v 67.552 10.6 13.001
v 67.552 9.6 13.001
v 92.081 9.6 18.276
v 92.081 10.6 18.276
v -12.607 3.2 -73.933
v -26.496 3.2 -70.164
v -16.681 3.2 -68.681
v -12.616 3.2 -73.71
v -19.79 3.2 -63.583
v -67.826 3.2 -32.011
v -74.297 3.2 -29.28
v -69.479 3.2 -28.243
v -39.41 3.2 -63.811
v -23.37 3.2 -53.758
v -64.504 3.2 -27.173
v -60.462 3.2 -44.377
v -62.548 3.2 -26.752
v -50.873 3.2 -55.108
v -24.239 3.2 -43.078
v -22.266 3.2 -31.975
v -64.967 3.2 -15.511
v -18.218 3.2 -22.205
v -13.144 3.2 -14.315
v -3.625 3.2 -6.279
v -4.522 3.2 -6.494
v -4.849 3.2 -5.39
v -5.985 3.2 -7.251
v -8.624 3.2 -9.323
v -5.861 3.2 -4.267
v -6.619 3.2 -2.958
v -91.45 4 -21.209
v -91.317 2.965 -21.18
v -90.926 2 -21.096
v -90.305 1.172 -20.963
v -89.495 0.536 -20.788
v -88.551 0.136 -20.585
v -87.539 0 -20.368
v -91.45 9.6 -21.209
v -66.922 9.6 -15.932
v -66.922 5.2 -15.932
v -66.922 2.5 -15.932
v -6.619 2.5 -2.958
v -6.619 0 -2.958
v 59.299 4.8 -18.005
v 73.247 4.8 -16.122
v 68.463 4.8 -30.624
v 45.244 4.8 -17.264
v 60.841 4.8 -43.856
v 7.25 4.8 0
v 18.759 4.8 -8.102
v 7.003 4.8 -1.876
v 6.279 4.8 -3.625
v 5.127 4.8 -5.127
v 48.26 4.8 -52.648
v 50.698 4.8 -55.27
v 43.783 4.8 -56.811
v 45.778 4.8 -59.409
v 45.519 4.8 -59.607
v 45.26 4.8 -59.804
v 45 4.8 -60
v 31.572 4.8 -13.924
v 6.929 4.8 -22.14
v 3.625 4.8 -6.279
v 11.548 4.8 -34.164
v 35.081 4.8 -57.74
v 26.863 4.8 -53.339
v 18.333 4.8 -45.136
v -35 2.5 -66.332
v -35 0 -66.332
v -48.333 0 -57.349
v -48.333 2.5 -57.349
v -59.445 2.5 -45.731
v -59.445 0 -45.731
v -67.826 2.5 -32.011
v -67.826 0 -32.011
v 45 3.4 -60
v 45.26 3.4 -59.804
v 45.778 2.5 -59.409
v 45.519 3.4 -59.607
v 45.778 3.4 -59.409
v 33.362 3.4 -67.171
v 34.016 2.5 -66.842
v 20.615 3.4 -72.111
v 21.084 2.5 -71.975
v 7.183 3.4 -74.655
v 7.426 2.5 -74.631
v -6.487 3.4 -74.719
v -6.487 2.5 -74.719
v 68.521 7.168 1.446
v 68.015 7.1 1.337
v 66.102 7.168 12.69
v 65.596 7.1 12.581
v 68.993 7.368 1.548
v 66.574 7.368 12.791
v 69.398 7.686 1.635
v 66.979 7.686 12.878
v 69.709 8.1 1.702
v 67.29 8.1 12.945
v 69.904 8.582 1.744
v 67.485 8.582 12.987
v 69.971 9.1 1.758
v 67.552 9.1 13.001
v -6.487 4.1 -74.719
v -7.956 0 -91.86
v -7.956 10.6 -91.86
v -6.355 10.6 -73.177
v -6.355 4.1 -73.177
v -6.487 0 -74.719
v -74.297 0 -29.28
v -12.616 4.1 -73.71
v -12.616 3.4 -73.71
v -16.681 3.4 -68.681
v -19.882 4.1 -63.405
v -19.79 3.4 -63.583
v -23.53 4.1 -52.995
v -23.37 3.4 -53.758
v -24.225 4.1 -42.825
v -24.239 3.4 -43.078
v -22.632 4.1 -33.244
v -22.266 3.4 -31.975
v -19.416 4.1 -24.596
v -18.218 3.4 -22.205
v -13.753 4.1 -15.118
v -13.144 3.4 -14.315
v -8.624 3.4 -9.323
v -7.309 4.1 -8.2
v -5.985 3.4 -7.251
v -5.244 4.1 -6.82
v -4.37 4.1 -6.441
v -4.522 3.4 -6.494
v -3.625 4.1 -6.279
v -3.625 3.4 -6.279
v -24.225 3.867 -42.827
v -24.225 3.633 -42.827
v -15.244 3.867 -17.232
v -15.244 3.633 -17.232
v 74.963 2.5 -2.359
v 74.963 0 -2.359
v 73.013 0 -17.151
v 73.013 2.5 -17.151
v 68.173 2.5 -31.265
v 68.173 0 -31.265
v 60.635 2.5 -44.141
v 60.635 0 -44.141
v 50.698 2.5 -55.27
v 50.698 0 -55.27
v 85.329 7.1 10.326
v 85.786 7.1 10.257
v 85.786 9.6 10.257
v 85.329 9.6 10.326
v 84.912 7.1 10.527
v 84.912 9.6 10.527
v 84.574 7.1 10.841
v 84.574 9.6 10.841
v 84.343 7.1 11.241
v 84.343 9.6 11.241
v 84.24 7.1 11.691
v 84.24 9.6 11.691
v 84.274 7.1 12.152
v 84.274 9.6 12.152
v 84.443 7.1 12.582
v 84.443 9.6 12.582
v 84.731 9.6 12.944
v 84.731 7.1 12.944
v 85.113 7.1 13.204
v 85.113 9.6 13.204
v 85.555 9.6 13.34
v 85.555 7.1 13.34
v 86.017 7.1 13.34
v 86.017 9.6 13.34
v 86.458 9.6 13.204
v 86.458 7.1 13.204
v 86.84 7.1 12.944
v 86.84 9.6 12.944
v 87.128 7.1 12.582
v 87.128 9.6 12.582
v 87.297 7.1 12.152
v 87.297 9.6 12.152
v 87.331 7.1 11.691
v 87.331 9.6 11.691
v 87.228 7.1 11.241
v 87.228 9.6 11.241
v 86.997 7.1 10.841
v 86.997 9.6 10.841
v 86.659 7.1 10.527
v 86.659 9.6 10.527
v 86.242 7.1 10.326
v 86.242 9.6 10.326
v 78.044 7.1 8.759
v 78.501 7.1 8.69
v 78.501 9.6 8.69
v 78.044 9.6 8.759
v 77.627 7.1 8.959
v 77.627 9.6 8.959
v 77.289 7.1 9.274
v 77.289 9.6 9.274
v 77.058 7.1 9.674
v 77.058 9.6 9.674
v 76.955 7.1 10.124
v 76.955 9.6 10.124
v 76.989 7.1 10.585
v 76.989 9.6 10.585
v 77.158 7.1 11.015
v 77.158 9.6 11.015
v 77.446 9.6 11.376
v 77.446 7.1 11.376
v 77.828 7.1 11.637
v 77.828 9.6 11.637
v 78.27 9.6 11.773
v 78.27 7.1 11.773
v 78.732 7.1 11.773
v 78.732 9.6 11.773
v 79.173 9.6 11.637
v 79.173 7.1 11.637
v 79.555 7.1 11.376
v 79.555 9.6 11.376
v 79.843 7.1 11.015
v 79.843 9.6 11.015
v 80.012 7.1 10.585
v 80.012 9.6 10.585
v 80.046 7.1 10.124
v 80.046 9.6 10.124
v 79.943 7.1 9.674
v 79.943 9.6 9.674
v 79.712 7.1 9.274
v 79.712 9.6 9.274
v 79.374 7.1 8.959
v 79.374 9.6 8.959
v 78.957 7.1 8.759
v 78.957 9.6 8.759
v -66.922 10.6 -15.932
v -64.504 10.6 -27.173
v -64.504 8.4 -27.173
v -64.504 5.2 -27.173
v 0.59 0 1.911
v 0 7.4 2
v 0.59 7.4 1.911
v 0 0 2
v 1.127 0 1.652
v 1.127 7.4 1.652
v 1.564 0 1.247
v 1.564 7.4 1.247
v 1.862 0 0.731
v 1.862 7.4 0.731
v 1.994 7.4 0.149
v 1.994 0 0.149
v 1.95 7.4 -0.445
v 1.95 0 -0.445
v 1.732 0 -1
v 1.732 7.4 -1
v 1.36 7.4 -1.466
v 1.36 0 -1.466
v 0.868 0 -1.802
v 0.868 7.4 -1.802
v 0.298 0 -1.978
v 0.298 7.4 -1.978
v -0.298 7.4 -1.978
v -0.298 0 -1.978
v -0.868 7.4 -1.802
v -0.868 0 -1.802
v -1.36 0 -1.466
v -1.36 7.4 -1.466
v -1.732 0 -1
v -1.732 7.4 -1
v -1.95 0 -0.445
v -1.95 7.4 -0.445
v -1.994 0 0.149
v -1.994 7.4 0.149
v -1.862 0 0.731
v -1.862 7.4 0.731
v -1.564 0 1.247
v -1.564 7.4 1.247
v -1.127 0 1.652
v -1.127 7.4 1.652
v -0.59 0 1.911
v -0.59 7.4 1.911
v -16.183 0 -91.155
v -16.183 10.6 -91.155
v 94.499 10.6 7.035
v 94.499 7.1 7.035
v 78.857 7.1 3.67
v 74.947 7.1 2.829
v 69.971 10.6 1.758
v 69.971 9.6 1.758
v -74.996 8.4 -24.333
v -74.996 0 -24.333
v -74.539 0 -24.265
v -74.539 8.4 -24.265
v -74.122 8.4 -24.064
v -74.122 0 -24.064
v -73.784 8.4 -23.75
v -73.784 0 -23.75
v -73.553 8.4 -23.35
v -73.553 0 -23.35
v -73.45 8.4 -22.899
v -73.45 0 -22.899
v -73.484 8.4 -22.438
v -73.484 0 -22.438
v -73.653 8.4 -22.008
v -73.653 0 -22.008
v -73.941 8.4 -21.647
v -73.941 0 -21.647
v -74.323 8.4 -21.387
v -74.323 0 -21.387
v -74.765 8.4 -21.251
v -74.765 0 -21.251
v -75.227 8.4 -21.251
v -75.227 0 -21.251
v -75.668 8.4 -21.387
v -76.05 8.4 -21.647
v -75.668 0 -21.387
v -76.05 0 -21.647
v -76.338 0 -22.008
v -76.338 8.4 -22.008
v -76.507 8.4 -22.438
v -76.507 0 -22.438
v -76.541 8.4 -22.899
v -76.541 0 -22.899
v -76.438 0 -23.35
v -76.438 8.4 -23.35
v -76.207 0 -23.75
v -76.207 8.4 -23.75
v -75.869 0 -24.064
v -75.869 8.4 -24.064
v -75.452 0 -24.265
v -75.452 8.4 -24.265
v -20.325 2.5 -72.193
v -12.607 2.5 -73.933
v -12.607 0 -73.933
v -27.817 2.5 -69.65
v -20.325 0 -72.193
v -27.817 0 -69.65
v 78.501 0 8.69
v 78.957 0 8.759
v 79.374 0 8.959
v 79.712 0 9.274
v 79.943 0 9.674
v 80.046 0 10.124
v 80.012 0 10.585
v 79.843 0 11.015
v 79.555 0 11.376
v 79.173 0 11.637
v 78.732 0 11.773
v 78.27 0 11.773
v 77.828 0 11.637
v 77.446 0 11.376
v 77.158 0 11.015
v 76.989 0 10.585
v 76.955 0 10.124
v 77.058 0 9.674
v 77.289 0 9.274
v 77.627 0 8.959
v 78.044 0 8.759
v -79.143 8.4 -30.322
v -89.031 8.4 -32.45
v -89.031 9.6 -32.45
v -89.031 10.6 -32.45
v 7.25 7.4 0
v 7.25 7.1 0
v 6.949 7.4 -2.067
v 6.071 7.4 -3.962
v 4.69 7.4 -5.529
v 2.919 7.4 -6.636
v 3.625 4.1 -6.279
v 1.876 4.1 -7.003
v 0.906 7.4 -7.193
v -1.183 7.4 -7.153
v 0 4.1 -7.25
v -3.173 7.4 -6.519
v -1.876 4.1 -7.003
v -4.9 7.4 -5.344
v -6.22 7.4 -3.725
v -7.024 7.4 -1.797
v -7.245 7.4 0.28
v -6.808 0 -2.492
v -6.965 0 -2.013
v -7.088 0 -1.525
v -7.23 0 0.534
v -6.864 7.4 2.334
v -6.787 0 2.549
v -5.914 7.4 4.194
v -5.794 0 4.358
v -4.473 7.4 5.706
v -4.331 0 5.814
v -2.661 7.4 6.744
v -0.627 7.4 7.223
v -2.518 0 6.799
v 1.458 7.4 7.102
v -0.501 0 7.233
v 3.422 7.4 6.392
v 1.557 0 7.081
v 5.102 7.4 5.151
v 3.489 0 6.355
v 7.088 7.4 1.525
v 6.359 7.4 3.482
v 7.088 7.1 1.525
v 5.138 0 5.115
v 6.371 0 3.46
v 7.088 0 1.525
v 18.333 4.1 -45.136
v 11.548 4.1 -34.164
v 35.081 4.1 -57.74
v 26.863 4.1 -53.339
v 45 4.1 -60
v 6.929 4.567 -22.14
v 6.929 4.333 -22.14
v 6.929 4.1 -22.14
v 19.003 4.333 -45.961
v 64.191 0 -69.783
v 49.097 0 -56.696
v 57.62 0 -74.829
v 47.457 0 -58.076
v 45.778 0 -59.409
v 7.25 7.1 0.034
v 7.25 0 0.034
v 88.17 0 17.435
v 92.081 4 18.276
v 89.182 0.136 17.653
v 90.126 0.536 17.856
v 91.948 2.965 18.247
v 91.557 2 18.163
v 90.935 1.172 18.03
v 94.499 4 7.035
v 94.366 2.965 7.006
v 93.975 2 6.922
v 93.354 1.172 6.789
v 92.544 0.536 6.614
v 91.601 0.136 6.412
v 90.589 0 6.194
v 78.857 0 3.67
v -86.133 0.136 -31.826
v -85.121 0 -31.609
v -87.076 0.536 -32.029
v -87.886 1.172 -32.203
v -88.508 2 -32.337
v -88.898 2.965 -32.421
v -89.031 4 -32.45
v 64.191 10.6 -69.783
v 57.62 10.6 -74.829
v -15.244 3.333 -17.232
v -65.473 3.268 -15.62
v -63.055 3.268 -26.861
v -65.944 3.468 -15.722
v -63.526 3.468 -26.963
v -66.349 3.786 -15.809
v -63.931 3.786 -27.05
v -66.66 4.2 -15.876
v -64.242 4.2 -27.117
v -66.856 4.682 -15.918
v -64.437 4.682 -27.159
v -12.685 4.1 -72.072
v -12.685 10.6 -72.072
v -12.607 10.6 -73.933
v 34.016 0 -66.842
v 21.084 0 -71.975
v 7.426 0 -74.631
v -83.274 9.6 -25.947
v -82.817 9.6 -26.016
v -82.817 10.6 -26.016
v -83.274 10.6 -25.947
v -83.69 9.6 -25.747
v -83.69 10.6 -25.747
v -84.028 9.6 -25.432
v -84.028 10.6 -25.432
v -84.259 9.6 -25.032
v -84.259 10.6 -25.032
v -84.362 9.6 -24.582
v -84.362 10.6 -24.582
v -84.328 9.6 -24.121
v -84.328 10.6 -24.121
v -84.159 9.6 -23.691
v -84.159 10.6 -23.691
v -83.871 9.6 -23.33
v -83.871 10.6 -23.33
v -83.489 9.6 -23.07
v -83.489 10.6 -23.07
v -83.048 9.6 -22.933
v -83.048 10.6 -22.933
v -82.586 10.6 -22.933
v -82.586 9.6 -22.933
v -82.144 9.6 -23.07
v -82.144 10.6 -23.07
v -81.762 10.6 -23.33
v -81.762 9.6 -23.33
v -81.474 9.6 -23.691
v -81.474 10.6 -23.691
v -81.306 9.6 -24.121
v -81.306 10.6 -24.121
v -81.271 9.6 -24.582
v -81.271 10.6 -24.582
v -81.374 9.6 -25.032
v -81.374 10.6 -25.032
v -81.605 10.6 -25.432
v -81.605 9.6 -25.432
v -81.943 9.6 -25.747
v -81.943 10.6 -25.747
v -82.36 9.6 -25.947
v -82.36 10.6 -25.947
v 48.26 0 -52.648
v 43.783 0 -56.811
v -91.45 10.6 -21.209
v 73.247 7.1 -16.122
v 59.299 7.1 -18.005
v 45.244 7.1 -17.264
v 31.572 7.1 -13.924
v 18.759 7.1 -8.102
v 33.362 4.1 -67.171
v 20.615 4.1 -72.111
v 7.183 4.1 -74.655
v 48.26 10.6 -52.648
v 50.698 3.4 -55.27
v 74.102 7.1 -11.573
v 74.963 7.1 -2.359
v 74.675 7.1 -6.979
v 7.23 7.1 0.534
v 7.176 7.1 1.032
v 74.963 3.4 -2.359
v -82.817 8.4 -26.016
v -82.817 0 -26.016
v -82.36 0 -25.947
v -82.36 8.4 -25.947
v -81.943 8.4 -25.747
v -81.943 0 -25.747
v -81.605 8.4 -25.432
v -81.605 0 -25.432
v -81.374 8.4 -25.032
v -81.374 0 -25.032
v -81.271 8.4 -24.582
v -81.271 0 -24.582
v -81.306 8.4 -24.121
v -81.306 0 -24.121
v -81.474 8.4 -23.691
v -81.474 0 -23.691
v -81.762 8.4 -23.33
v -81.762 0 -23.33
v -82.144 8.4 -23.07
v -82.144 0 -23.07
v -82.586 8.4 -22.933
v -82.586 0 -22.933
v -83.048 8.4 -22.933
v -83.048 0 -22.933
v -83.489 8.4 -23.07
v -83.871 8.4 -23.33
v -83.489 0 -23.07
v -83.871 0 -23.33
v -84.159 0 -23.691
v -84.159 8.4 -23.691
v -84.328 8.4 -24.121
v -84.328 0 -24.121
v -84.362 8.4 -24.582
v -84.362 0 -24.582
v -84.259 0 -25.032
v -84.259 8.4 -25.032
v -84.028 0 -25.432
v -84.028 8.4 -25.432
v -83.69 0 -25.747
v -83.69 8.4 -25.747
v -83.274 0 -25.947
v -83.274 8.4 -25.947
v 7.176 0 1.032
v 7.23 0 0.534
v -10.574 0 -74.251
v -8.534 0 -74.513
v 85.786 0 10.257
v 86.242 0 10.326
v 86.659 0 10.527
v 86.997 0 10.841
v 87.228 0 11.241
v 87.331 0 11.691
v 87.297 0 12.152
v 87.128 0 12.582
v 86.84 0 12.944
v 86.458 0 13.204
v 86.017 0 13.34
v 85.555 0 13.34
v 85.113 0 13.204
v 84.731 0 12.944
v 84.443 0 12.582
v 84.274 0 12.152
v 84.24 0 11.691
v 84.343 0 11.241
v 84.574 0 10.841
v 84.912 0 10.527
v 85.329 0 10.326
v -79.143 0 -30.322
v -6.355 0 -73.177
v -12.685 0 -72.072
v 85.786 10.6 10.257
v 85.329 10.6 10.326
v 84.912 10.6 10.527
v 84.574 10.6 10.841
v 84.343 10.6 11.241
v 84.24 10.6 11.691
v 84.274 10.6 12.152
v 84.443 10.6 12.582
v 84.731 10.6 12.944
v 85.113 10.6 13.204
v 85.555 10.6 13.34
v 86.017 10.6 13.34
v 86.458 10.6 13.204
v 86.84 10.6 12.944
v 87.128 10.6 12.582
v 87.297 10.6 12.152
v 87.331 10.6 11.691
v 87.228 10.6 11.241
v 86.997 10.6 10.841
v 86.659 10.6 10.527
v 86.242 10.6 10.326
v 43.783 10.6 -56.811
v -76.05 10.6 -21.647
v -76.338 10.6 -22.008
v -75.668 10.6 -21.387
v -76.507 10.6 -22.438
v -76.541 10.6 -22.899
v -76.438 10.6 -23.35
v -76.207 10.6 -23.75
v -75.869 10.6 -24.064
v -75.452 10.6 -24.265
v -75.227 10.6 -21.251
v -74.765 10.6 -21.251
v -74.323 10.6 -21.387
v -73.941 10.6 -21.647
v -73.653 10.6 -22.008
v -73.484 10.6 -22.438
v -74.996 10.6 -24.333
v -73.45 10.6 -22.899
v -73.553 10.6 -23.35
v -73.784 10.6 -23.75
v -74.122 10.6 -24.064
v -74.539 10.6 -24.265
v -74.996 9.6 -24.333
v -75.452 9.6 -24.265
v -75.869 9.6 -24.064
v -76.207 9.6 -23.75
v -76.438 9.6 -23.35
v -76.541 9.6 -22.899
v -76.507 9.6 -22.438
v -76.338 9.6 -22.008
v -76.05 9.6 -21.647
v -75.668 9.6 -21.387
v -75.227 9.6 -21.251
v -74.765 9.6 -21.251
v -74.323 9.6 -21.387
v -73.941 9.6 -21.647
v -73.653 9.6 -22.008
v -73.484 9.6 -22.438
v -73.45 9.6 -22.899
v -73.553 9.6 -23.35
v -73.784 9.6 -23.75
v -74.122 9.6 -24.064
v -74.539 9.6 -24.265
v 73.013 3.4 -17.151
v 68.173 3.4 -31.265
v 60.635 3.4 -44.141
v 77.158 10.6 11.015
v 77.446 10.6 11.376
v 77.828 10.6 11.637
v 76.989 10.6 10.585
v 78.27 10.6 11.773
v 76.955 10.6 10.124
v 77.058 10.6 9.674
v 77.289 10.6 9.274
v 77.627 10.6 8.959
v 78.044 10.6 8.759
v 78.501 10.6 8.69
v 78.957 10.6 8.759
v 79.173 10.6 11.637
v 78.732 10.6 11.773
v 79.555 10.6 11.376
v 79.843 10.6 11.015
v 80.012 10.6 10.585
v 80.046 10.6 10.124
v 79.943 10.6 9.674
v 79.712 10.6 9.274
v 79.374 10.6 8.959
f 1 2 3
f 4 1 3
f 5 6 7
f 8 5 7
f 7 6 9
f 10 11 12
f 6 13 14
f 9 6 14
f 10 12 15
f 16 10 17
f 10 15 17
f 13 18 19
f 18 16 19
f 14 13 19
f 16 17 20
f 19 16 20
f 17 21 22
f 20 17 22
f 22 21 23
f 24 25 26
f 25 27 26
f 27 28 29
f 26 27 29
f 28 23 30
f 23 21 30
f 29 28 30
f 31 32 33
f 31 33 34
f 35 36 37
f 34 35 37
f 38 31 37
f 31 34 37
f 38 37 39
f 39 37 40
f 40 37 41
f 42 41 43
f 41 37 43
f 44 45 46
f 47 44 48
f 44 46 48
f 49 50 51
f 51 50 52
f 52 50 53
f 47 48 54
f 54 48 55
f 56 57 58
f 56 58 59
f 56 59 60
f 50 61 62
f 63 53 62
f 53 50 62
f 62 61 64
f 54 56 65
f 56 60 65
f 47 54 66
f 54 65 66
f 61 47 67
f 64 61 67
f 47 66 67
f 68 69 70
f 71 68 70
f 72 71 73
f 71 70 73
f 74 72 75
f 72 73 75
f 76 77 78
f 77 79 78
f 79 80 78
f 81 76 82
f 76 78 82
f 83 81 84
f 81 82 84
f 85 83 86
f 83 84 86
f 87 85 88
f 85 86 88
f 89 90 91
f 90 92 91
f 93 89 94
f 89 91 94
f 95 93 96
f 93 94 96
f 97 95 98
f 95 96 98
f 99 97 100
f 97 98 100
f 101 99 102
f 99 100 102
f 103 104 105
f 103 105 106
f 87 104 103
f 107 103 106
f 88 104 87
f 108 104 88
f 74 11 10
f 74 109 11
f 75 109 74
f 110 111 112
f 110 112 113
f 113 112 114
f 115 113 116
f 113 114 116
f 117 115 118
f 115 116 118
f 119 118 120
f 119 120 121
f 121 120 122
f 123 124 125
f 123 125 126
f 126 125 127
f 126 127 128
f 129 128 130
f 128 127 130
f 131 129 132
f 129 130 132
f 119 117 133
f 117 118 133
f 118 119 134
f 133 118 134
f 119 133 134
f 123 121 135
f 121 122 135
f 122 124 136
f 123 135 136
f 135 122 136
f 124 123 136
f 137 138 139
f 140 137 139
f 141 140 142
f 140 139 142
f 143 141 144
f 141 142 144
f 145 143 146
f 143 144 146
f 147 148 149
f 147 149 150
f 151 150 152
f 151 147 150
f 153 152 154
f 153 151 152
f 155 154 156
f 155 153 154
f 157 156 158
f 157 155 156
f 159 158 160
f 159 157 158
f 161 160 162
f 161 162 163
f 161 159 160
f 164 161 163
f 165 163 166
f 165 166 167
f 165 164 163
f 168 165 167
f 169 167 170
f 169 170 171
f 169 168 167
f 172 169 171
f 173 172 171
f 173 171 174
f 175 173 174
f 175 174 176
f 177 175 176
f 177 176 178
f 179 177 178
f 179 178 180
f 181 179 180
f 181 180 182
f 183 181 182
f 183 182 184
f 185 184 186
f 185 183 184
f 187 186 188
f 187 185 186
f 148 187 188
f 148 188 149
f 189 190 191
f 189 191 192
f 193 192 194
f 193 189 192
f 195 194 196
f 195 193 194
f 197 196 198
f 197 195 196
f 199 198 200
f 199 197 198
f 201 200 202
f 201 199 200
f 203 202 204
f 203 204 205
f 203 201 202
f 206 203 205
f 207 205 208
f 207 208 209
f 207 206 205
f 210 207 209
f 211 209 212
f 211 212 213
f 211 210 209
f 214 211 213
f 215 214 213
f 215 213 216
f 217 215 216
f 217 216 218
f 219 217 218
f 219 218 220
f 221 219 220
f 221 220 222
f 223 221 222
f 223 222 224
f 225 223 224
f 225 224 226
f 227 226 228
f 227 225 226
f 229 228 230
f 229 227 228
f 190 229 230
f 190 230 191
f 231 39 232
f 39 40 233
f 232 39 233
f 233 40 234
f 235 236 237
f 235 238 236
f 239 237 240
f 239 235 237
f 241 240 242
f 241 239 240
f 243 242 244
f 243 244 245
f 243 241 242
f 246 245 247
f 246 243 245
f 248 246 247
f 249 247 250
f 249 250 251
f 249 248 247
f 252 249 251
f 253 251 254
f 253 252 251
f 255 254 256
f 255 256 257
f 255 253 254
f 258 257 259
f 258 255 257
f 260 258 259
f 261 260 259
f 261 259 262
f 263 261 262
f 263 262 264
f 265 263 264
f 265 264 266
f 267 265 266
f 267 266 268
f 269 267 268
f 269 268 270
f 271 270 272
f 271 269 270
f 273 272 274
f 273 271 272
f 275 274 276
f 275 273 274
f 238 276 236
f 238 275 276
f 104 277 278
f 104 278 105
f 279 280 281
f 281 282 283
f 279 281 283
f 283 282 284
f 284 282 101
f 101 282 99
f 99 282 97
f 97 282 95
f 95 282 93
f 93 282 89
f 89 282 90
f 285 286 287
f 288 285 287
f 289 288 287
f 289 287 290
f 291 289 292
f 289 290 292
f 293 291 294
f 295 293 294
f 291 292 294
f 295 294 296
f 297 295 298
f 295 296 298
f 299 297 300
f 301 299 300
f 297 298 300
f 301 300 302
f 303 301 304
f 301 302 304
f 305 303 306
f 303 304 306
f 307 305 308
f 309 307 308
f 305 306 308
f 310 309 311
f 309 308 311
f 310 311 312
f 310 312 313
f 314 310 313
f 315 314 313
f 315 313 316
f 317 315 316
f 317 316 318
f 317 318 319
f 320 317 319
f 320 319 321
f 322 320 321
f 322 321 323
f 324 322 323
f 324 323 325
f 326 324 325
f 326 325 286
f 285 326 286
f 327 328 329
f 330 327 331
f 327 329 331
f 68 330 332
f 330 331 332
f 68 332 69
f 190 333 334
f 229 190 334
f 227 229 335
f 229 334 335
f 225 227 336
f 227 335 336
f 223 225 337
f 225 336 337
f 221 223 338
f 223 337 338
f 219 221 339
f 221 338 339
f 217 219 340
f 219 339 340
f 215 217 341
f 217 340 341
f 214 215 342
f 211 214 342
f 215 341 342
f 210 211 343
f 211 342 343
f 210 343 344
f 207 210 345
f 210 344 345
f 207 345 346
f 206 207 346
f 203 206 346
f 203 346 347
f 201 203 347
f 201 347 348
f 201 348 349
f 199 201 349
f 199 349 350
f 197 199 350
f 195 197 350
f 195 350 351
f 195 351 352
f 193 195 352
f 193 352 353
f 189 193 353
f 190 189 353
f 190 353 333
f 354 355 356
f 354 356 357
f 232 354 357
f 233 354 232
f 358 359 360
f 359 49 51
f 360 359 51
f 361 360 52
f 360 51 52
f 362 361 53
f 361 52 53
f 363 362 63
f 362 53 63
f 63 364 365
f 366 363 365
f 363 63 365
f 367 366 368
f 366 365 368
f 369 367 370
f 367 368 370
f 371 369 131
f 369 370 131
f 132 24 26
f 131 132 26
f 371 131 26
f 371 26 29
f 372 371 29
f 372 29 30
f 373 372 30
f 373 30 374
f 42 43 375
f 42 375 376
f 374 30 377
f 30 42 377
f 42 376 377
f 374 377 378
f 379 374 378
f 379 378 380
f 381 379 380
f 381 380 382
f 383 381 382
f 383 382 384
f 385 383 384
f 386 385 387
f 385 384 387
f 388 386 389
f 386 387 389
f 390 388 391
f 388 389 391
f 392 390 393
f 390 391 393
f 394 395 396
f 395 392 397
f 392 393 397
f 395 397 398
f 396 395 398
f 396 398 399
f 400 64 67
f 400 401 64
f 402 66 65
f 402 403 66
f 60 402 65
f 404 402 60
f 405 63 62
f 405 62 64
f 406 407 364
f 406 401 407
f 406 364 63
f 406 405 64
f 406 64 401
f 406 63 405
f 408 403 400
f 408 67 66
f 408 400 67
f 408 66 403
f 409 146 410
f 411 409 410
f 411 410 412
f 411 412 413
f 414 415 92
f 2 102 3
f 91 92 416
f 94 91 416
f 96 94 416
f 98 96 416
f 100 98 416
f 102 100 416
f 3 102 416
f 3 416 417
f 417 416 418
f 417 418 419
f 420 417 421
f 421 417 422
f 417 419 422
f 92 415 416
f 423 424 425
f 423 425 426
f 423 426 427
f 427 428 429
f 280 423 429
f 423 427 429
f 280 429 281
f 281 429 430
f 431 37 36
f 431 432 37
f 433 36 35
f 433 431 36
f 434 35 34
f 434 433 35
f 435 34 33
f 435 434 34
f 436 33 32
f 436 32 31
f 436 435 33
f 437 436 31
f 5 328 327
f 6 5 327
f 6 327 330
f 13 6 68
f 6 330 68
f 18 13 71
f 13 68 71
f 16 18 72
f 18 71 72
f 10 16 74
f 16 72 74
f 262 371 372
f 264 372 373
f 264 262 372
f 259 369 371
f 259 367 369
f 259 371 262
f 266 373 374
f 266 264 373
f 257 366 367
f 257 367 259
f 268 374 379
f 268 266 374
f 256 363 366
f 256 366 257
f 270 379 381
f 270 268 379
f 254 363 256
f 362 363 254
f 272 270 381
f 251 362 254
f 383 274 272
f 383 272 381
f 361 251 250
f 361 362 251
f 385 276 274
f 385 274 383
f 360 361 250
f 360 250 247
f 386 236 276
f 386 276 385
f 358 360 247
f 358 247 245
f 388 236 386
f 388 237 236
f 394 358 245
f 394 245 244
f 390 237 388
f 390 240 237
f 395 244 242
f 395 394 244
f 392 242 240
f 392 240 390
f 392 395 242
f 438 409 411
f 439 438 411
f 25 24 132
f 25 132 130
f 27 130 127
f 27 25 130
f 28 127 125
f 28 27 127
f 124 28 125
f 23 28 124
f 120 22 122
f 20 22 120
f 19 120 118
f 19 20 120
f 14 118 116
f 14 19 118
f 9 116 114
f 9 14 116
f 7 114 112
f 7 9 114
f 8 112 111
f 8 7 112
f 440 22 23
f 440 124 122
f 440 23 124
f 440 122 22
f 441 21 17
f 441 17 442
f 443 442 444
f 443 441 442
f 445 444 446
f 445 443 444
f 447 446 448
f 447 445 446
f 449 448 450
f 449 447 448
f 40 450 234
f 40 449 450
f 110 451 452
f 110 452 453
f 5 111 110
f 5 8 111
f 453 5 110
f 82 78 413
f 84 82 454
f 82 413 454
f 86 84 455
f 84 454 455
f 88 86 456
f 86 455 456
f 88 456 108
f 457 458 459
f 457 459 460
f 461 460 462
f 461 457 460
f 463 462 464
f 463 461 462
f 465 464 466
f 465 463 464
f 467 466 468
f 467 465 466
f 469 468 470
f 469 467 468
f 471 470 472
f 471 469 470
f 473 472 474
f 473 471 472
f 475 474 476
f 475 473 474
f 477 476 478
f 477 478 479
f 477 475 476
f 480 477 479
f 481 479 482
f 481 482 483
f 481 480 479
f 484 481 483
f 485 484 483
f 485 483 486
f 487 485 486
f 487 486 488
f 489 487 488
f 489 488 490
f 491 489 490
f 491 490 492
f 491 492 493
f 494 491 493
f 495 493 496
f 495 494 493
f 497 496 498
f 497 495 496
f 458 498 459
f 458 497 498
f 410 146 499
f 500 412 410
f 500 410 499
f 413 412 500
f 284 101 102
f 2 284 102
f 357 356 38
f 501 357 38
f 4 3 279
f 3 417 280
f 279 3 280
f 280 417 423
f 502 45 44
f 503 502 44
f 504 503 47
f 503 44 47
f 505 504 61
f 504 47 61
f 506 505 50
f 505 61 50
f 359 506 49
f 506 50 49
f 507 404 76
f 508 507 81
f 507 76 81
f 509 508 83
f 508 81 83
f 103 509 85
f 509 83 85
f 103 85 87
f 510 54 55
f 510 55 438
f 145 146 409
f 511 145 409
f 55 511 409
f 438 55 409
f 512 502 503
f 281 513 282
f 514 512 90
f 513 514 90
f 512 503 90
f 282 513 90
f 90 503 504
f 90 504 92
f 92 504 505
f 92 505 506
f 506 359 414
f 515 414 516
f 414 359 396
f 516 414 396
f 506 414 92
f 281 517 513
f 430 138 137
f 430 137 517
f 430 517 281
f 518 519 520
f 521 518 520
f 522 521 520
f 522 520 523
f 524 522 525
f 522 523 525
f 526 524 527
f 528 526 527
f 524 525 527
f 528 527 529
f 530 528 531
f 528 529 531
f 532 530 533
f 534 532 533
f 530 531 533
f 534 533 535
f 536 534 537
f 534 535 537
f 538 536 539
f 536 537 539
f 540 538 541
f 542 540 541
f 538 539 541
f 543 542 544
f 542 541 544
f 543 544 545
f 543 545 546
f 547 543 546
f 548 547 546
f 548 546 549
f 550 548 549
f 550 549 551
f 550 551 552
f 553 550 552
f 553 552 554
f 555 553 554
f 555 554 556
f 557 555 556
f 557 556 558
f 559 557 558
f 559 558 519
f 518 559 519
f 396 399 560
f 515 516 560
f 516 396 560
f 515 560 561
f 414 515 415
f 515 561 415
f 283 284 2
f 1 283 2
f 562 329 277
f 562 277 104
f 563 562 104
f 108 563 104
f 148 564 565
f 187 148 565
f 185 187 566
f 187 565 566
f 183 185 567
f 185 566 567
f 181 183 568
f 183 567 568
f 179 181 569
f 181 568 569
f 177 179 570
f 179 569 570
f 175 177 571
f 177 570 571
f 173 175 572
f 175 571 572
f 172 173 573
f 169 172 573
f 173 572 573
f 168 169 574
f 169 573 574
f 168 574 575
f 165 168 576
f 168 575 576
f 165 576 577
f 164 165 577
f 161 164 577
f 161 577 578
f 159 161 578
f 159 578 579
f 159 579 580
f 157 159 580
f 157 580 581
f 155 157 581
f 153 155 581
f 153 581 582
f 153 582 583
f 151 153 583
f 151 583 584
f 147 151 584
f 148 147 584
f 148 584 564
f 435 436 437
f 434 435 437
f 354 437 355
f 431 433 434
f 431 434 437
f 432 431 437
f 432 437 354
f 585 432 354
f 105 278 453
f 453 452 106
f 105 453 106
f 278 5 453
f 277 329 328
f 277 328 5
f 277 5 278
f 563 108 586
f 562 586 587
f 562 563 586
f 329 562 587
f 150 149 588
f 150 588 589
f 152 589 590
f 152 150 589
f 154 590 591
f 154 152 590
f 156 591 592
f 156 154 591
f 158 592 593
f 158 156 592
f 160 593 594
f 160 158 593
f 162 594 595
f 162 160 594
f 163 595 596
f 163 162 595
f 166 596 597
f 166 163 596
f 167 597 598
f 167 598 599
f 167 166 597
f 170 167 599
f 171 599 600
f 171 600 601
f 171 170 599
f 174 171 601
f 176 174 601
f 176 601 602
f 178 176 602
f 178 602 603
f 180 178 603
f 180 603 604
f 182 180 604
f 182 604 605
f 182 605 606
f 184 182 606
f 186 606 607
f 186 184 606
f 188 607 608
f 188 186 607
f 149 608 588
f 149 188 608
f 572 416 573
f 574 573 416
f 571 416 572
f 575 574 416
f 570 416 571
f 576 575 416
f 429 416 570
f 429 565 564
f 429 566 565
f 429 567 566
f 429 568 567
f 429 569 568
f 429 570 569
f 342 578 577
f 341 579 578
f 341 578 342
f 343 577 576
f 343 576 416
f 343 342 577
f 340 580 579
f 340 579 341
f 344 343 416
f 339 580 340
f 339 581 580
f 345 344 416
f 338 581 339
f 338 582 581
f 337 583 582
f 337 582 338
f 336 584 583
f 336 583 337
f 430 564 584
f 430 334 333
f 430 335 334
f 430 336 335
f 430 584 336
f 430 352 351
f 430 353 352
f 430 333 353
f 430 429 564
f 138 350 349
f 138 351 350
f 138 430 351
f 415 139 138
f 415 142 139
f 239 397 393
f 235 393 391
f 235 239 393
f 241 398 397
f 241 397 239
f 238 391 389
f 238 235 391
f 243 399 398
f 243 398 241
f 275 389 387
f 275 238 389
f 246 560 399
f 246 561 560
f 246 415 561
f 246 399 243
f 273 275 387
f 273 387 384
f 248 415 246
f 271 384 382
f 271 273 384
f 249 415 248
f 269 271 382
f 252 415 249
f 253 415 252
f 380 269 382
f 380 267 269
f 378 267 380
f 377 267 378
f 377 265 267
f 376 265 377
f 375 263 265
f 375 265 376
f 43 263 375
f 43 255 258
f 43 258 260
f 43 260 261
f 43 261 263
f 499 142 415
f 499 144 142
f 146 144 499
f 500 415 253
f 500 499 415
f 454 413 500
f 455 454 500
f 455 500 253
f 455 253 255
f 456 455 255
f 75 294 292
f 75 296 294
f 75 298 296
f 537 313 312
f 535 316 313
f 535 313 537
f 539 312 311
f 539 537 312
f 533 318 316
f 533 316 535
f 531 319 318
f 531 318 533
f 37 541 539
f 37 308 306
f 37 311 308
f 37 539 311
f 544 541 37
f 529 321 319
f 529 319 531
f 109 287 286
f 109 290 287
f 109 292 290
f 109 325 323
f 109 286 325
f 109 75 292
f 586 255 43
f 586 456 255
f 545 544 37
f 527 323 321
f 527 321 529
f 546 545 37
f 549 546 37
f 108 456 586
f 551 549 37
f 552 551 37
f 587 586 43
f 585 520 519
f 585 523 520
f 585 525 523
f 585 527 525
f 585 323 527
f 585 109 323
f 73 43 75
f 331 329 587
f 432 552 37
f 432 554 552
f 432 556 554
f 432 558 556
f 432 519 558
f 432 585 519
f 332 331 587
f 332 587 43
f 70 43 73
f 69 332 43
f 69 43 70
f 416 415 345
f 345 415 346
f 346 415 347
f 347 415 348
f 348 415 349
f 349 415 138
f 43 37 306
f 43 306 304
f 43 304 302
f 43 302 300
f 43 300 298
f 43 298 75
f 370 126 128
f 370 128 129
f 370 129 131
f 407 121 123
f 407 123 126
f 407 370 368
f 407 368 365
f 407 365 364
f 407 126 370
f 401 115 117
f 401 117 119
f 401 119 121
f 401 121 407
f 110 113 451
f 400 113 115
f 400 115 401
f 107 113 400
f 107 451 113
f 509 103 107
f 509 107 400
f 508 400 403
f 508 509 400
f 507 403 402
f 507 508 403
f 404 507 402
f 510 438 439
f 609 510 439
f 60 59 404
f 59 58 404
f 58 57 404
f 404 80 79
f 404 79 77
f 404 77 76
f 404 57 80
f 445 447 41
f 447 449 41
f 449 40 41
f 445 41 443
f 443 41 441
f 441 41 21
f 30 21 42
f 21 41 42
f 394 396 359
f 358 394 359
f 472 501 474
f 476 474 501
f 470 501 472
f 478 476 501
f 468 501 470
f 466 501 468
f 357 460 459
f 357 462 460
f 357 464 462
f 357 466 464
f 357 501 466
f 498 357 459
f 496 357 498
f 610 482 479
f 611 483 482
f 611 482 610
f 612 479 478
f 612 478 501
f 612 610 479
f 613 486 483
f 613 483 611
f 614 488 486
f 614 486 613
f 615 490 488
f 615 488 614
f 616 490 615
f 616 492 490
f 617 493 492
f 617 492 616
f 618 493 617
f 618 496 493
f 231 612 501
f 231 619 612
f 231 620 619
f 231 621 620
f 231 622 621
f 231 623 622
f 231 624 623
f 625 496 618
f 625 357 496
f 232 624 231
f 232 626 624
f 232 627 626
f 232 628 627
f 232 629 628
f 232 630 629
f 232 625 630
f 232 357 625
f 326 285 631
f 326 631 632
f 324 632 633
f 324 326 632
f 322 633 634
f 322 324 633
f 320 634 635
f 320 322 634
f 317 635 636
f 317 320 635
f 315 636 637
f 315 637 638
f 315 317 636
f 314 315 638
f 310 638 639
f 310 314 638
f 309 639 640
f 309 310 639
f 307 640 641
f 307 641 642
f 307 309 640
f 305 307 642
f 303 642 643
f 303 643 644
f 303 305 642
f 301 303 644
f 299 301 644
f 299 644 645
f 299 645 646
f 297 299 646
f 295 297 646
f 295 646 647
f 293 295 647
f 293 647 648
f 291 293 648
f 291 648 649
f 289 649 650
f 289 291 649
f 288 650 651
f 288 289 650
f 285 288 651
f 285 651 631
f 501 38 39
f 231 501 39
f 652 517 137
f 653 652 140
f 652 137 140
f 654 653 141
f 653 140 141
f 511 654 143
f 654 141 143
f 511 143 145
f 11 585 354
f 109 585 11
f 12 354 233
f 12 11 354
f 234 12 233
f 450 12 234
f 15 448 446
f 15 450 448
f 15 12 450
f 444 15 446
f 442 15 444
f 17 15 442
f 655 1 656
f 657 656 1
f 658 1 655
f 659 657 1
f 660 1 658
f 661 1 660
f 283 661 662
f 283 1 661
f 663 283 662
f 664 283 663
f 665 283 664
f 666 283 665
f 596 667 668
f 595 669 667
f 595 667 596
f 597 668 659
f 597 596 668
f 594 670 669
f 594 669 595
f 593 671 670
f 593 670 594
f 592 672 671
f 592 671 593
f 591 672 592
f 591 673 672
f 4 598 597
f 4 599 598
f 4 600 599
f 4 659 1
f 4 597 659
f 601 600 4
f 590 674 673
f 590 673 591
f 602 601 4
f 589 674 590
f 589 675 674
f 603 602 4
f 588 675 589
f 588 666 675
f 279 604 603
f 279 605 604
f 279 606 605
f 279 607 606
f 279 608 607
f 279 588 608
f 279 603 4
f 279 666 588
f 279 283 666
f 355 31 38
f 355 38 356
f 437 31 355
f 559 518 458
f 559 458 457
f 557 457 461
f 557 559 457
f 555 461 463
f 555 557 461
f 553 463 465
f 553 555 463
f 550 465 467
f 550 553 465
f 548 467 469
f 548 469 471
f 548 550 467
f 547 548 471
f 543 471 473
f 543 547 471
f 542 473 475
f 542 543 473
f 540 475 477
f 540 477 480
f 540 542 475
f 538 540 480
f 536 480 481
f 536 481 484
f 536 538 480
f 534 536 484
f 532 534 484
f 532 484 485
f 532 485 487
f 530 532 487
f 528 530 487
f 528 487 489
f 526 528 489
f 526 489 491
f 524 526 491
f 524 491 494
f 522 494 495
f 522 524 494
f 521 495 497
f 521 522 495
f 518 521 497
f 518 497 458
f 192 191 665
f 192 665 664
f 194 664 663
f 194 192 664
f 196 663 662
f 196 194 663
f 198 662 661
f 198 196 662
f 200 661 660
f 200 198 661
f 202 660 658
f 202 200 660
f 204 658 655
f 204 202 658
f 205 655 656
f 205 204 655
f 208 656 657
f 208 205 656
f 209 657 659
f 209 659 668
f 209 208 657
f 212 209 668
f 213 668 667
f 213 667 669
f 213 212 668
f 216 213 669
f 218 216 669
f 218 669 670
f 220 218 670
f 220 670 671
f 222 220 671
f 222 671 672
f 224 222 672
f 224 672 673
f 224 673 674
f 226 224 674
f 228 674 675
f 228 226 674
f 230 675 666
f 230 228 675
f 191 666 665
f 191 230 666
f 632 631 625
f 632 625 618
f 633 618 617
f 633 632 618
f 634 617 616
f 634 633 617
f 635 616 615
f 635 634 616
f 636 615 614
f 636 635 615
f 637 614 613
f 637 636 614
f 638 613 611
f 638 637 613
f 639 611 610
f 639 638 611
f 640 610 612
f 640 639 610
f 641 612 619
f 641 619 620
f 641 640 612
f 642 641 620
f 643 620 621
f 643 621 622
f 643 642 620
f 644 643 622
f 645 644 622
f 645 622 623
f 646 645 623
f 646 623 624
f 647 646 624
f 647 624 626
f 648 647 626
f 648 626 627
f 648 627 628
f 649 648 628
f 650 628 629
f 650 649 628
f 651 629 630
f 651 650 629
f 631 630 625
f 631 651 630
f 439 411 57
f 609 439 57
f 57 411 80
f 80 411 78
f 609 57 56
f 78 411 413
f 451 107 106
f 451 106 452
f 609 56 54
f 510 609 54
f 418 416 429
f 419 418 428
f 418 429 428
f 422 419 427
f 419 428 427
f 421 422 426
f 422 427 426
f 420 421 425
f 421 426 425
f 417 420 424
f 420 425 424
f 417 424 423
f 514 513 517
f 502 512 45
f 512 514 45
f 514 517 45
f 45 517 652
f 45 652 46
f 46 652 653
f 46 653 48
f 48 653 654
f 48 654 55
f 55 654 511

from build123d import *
from build123d.topology import SkipClean

# Parameters (mm, degrees)
SKETCH1_R            = 7.25
SKETCH1_R_2          = 2
BOSS_EXTRUDE1_DEPTH  = 7.4
BOSS_EXTRUDE3_START  = -7.4
BOSS_EXTRUDE3_DEPTH  = 2.5
BOSS_EXTRUDE4_DEPTH  = 0.9
BOSS_EXTRUDE5_DEPTH  = 0.7
BOSS_EXTRUDE6_DEPTH  = 8.4
BOSS_EXTRUDE7_START  = -2.5
BOSS_EXTRUDE7_DEPTH  = 8.4
BOSS_EXTRUDE8_START  = -4.1
BOSS_EXTRUDE8_DEPTH  = 8.4
CUT_EXTRUDE1_DEPTH   = 5
BOSS_EXTRUDE9_START  = 5
SKETCH10_R           = 7.25
SKETCH10_R_2         = 2
BOSS_EXTRUDE9_DEPTH  = 5
BOSS_EXTRUDE10_REACH = 122.721
CUT_EXTRUDE2_DEPTH   = 121.788738675
CUT_EXTRUDE3_START   = -1.3
CUT_EXTRUDE3_DEPTH   = 1.3
SKETCH17_R           = 1.55
CUT_EXTRUDE4_DEPTH   = 121.936633783
SKETCH18_R           = 1.55
BOSS_EXTRUDE11_DEPTH = 1.2
SKETCH19_R           = 1.55
BOSS_EXTRUDE12_DEPTH = 2.5
CUT_EXTRUDE5_DEPTH   = 122.0259038
SKETCH21_R           = 1.55
BOSS_EXTRUDE13_DEPTH = 1
BOSS_EXTRUDE14_DEPTH = 0.7
BOSS_EXTRUDE16_DEPTH = 0.7
BOSS_EXTRUDE17_DEPTH = 1.4
FILLET1_R            = 2
FILLET2_R            = 4
CHAMFER1_SIZE        = 4
CHAMFER1_SIZE_2      = 4.928784719
BOSS_EXTRUDE18_DEPTH = 10.6


with BuildPart() as part:
    # Sketch1 → Boss-Extrude1 (new body)
    with BuildSketch(Plane(origin=(0, 0, 0), x_dir=(1, 0, 0), z_dir=(0, 1, 0))):
        with Locations(Location((0, 0, 0), (0, 0, 270))):
            Circle(SKETCH1_R)
        with Locations(Location((0, 0, 0), (0, 0, 270))):
            Circle(SKETCH1_R_2, mode=Mode.SUBTRACT)
    extrude(amount=BOSS_EXTRUDE1_DEPTH)

    # Sketch2 → Boss-Extrude3 (add)
    with BuildSketch(Plane(origin=(0, 7.4, 0), x_dir=(1, 0, 0), z_dir=(0, 1, 0)).offset(BOSS_EXTRUDE3_START)):
        with BuildLine():
            add(Edge.make_bspline(
                [(-5.126524164, -5.126524164), (-34.917072205, -19.205568344), (-61.161686636, -4.675863942), (-71.850724271, 21.505195227)],
                knots=[0, 0, 0, 0, 0.672240243, 0.672240243, 0.672240243, 0.672240243], degree=3))
            ThreePointArc((-5.126524164, -5.126524164), (-2.774454885, 6.698126611), (7.25, 0))
            Line((7.25, 0), (75, 0))
            ThreePointArc((75, 0), (38.729833462, 64.226162893), (-35, 66.332495807))
            ThreePointArc((-35, 66.332495807), (-57.936525945, 47.62729219), (-71.850724271, 21.505195227))
        make_face()
    extrude(amount=BOSS_EXTRUDE3_DEPTH)

    # Sketch3 → Boss-Extrude4 (add)
    with BuildSketch(Plane(origin=(0, 2.5, 0), x_dir=(1, 0, 0), z_dir=(0, 1, 0))):
        with BuildLine():
            add(Edge.make_bspline(
                [(-3.625, 6.278684177), (-10.597848388, 6.793882103), (-40.677167551, 43.511602441), (-12.374173258, 73.972155817)],
                knots=[0, 0, 0, 0, 0.867348457, 0.867348457, 0.867348457, 0.867348457], degree=3))
            ThreePointArc((-3.625, 6.278684177), (3.625, 6.278684177), (7.25, 0))
            Line((7.25, 0), (75, 0))
            ThreePointArc((75, 0), (48.460999812, 57.2409949), (-12.374173258, 73.972155817))
        make_face()
    extrude(amount=BOSS_EXTRUDE4_DEPTH)



with BuildPart() as body_2:
    # Sketch4 → Boss-Extrude5 (new body)
    with BuildSketch(Plane(origin=(0, 3.4, 0), x_dir=(1, 0, 0), z_dir=(0, 1, 0))):
        with BuildLine():
            Line((7.25, 0), (75, 0))
            ThreePointArc((75, 0), (67.082039325, 33.541019662), (45, 60))
            add(Edge.make_bspline(
                [(3.625, 6.278684177), (4.262653192, 12.246368212), (10.323317408, 56.764848912), (45, 60)],
                knots=[0, 0, 0, 0, 1, 1, 1, 1], degree=3))
            ThreePointArc((3.625, 6.278684177), (6.278684177, 3.625), (7.25, 0))
        make_face()
    extrude(amount=BOSS_EXTRUDE5_DEPTH)


with BuildPart() as part_1:
    with SkipClean():  # the faces are left unmerged after this step: merging them gives an invalid solid
        add(part.part)

        add(body_2.part)  # Boss-Extrude6 merges body 2
        # Sketch6 → Boss-Extrude6 (add)
        with BuildSketch(Plane(origin=(0, 0, 0), x_dir=(-1, 0, 0), z_dir=(0, -1, 0))):
            with BuildLine():
                ThreePointArc((-75, 0), (-74.579396143, -7.931813846), (-73.32230211, -15.774663651))
                Line((-73.32230211, -15.774663651), (-7.087822537, -1.524884153))
                ThreePointArc((-7.087822537, -1.524884153), (-7.209341627, -0.766742005), (-7.25, 0))
                Line((-7.25, 0), (-75, 0))
            make_face()
        extrude(amount=-BOSS_EXTRUDE6_DEPTH)

    # Sketch7 → Boss-Extrude7 (add)
    with BuildSketch(Plane(origin=(0, 2.5, 0), x_dir=(1, 0, 0), z_dir=(0, 1, 0)).offset(BOSS_EXTRUDE7_START)):
        with BuildLine():
            Line((-63.545995162, 13.671375165), (-81.876570689, 17.615041077))
            Line((-81.876570689, 17.615041077), (-79.142687321, 30.32241961))
            Line((-79.142687321, 30.32241961), (-59.52859355, 26.102615769))
            ThreePointArc((-59.52859355, 26.102615769), (-61.850404464, 19.9881832), (-63.545995162, 13.671375165))
        make_face()
    extrude(amount=BOSS_EXTRUDE7_DEPTH)

    # Sketch8 → Boss-Extrude8 (add)
    with SkipClean():  # the faces are left unmerged after this step: merging them gives an invalid solid
        with BuildSketch(Plane(origin=(0, 4.1, 0), x_dir=(1, 0, 0), z_dir=(0, 1, 0)).offset(BOSS_EXTRUDE8_START)):
            Polygon((-79.142687321, 30.32241961), (-81.876570689, 17.615041077), (-91.765372585, 19.742531886), (-89.031489217, 32.449910419), align=None)
            with BuildLine():
                Line((73.32230211, -15.774663651), (91.765372585, -19.742531886))
                Line((91.765372585, -19.742531886), (94.499255953, -7.035153354))
                Line((94.499255953, -7.035153354), (74.946642057, -2.82857638))
                ThreePointArc((74.946642057, -2.82857638), (74.416532068, -9.33700996), (73.32230211, -15.774663651))
            make_face()
        extrude(amount=BOSS_EXTRUDE8_DEPTH)

    # Sketch9 → Cut-Extrude1 (cut)
    with BuildSketch(Plane.XZ):
        Polygon((-91.765372585, -19.742531886), (91.765372585, 19.742531886), (87.979453309, 37.339884393), (-95.551291862, -2.14517938), align=None)
    extrude(amount=-CUT_EXTRUDE1_DEPTH, mode=Mode.SUBTRACT)

    # Sketch10 → Boss-Extrude9 (add)
    with BuildSketch(Plane.XZ.offset(-5).offset(BOSS_EXTRUDE9_START)):
        Circle(SKETCH10_R)
        with Locations(Location((0, 0, 0), (0, 0, 90))):
            Circle(SKETCH10_R_2, mode=Mode.SUBTRACT)
    extrude(amount=-BOSS_EXTRUDE9_DEPTH)

    # Boss-Extrude10: up to this face of the body (flat: up to its plane)
    boss_extrude10_end = Plane(part_1.part.faces().sort_by_distance((60.073544854, 8.4, 7.102164941))[0])
    # Sketch12 → Boss-Extrude10 (add, up to the picked face)
    with BuildSketch(Plane(origin=(0, 4.1, 0), x_dir=(1, 0, 0), z_dir=(0, 1, 0)), mode=Mode.PRIVATE) as boss_extrude10_sk1:
        with BuildLine():
            Line((7.25, 0), (75, 0))
            ThreePointArc((75, 0), (74.56036467, 8.108761945), (73.246612793, 16.122459937))
            ThreePointArc((73.246612793, 16.122459937), (38.330105093, 15.91330646), (7.25, 0))
        make_face()
    boss_extrude10_tool1 = split(extrude(boss_extrude10_sk1.sketch, amount=BOSS_EXTRUDE10_REACH, mode=Mode.PRIVATE), bisect_by=boss_extrude10_end, keep=Keep.BOTH, mode=Mode.PRIVATE)
    add(boss_extrude10_tool1.solids().sort_by(Axis((46.982662, 4.1, -7.736412), (0, 1, 0)))[0])

    # Sketch13 → Cut-Extrude2 (cut, through all)
    with SkipClean():  # the faces are left unmerged after this step: merging them gives an invalid solid
        with BuildSketch(Plane(origin=(0, 2.5, 0), x_dir=(1, 0, 0), z_dir=(0, 1, 0))):
            Polygon((-59.52859355, 26.102615769), (-61.850404464, 19.9881832), (-63.545995162, 13.671375165), (-67.237617804, 14.465596075), (-64.503734436, 27.172974607), align=None)
        extrude(amount=CUT_EXTRUDE2_DEPTH, mode=Mode.SUBTRACT)

    # Sketch16 → Cut-Extrude3 (cut)
    with SkipClean():  # the faces are left unmerged after this step: merging them gives an invalid solid
        with BuildSketch(Plane(origin=(0, 8.4, 0), x_dir=(1, 0, 0), z_dir=(0, 1, 0)).offset(CUT_EXTRUDE3_START)):
            with BuildLine():
                Line((7.087822537, -1.524884153), (7.25, 0))
                ThreePointArc((7.25, 0), (38.330105093, 15.91330646), (73.246612793, 16.122459937))
                ThreePointArc((73.246612793, 16.122459937), (74.809258318, 6.710869331), (74.946642057, -2.82857638))
                Line((74.946642057, -2.82857638), (94.499255953, -7.035153354))
                Line((94.499255953, -7.035153354), (91.765372585, -19.742531886))
                Line((91.765372585, -19.742531886), (7.087822537, -1.524884153))
            make_face()
        extrude(amount=CUT_EXTRUDE3_DEPTH, mode=Mode.SUBTRACT)

    # Sketch17 → Cut-Extrude4 (cut, through all)
    with SkipClean():  # the faces are left unmerged after this step: merging them gives an invalid solid
        with BuildSketch(Plane.XZ):
            with Locations(Location((-82.816641613, -24.466016677, 0), (0, 0, 270))):
                Circle(SKETCH17_R)
            with Locations(Location((-74.995596054, -22.783385887, 0), (0, 0, 270))):
                Circle(SKETCH17_R)
            with Locations(Location((78.500615114, 10.240005813, 0), (0, 0, 270))):
                Circle(SKETCH17_R)
            with Locations(Location((85.785548012, 11.807296568, 0), (0, 0, 270))):
                Circle(SKETCH17_R)
        extrude(amount=-CUT_EXTRUDE4_DEPTH, mode=Mode.SUBTRACT)

    # Sketch18 → Boss-Extrude11 (add)
    with SkipClean():  # the faces are left unmerged after this step: merging them gives an invalid solid
        with BuildSketch(Plane(origin=(0, 8.4, 0), x_dir=(1, 0, 0), z_dir=(0, 1, 0))):
            Polygon((-89.031489217, 32.449910419), (-64.503734436, 27.172974607), (-67.237617804, 14.465596075), (-91.765372585, 19.742531886), align=None)
            with Locations(Location((-82.816641613, 24.466016677, 0), (0, 0, 90))):
                Circle(SKETCH18_R, mode=Mode.SUBTRACT)
            with Locations(Location((-74.995596054, 22.783385887, 0), (0, 0, 90))):
                Circle(SKETCH18_R, mode=Mode.SUBTRACT)
        extrude(amount=BOSS_EXTRUDE11_DEPTH)

    # Sketch19 → Boss-Extrude12 (add)
    with SkipClean():  # the faces are left unmerged after this step: merging them gives an invalid solid
        with BuildSketch(Plane(origin=(0, 7.1, 0), x_dir=(1, 0, 0), z_dir=(0, 1, 0))):
            Polygon((91.765372585, -19.742531886), (94.499255953, -7.035153354), (69.970501821, -1.758002541), (67.236618453, -14.465381073), align=None)
            with Locations(Location((78.500615114, -10.240005813, 0), (0, 0, 90))):
                Circle(SKETCH19_R, mode=Mode.SUBTRACT)
            with Locations(Location((85.785548012, -11.807296568, 0), (0, 0, 90))):
                Circle(SKETCH19_R, mode=Mode.SUBTRACT)
        extrude(amount=BOSS_EXTRUDE12_DEPTH)

    # Sketch20 → Cut-Extrude5 (cut, through all)
    with SkipClean():  # the faces are left unmerged after this step: merging them gives an invalid solid
        with BuildSketch(Plane.XZ):
            with BuildLine():
                Line((7.249919711, 0.034120129), (92.080865858, 18.276085844))
                Line((92.080865858, 18.276085844), (91.765372585, 19.742531886))
                Line((91.765372585, 19.742531886), (7.087822537, 1.524884153))
                ThreePointArc((7.087822537, 1.524884153), (7.207517432, 0.78370432), (7.249919711, 0.034120129))
            make_face()
            with BuildLine():
                Line((-7.087822537, -1.524884153), (-91.765372585, -19.742531886))
                Line((-91.765372585, -19.742531886), (-91.449879312, -21.208977929))
                Line((-91.449879312, -21.208977929), (-6.618968806, -2.95833601))
                ThreePointArc((-6.618968806, -2.95833601), (-6.89077124, -2.25383489), (-7.087822537, -1.524884153))
            make_face()
        extrude(amount=-CUT_EXTRUDE5_DEPTH, mode=Mode.SUBTRACT)

    # Sketch21 → Boss-Extrude13 (add)
    # profile 1 of 2: a face of its own
    with SkipClean():  # the faces are left unmerged after this step: merging them gives an invalid solid
        with BuildSketch(Plane(origin=(0, 9.6, 0), x_dir=(1, 0, 0), z_dir=(0, 1, 0))):
            Polygon((69.970501821, -1.758002541), (67.551595408, -13.001334932), (92.080865858, -18.276085844), (94.499255953, -7.035153354), align=None)
            with Locations(Location((85.785548012, -11.807296568, 0), (0, 0, 90))):
                Circle(SKETCH21_R, mode=Mode.SUBTRACT)
            with Locations(Location((78.500615114, -10.240005813, 0), (0, 0, 90))):
                Circle(SKETCH21_R, mode=Mode.SUBTRACT)
        # profile 2 of 2: a face of its own
        with BuildSketch(Plane(origin=(0, 9.6, 0), x_dir=(1, 0, 0), z_dir=(0, 1, 0))):
            Polygon((-89.031489217, 32.449910419), (-91.449879312, 21.208977929), (-66.922124531, 15.932042117), (-64.503734436, 27.172974607), align=None)
            with Locations(Location((-74.995596054, 22.783385887, 0), (0, 0, 90))):
                Circle(SKETCH21_R, mode=Mode.SUBTRACT)
            with Locations(Location((-82.816641613, 24.466016677, 0), (0, 0, 90))):
                Circle(SKETCH21_R, mode=Mode.SUBTRACT)
        extrude(amount=BOSS_EXTRUDE13_DEPTH)

    # Sketch22 → Boss-Extrude14 (add)
    with SkipClean():  # the faces are left unmerged after this step: merging them gives an invalid solid
        with BuildSketch(Plane(origin=(0, 2.5, 0), x_dir=(1, 0, 0), z_dir=(0, 1, 0))):
            with BuildLine():
                Line((-66.922124531, 15.932042117), (-6.618968806, 2.95833601))
                ThreePointArc((-6.618968806, 2.95833601), (-5.384320033, 4.855058989), (-3.625, 6.278684177))
                add(Edge.make_bspline(
                    [(-3.625, 6.278684177), (-10.597848388, 6.793882103), (-40.677167551, 43.511602441), (-12.374173258, 73.972155817)],
                    knots=[0, 0, 0, 0, 0.867348457, 0.867348457, 0.867348457, 0.867348457], degree=3))
                ThreePointArc((-12.374173258, 73.972155817), (-46.880291054, 58.542619609), (-69.478875321, 28.243333445))
                Line((-69.478875321, 28.243333445), (-64.503734436, 27.172974607))
                Line((-64.503734436, 27.172974607), (-66.922124531, 15.932042117))
            make_face()
        extrude(amount=BOSS_EXTRUDE14_DEPTH)

    # Sketch23 → Boss-Extrude16 (add)
    with SkipClean():  # the faces are left unmerged after this step: merging them gives an invalid solid
        with BuildSketch(Plane(origin=(0, 3.4, 0), x_dir=(1, 0, 0), z_dir=(0, 1, 0))):
            with BuildLine():
                ThreePointArc((45, 60), (17.745884796, 72.870320246), (-12.374173258, 73.972155817))
                add(Edge.make_bspline(
                    [(-12.374173258, 73.972155817), (-40.677167551, 43.511602441), (-10.597848388, 6.793882103), (-3.625, 6.278684177)],
                    knots=[0, 0, 0, 0, 0.867348457, 0.867348457, 0.867348457, 0.867348457], degree=3))
                ThreePointArc((-3.625, 6.278684177), (0, 7.25), (3.625, 6.278684177))
                add(Edge.make_bspline(
                    [(3.625, 6.278684177), (4.262653192, 12.246368212), (10.323317408, 56.764848912), (45, 60)],
                    knots=[0, 0, 0, 0, 1, 1, 1, 1], degree=3))
            make_face()
        extrude(amount=BOSS_EXTRUDE16_DEPTH)

    # Sketch23<4> → Boss-Extrude17 (add)
    with SkipClean():  # the faces are left unmerged after this step: merging them gives an invalid solid
        with BuildSketch(Plane(origin=(0, 3.4, 0), x_dir=(1, 0, 0), z_dir=(0, 1, 0))):
            with BuildLine():
                ThreePointArc((73.246612793, 16.122459937), (38.330105093, 15.91330646), (7.25, 0))
                ThreePointArc((7.25, 0), (6.278684177, 3.625), (3.625, 6.278684177))
                add(Edge.make_bspline(
                    [(3.625, 6.278684177), (4.262653192, 12.246368212), (10.323317408, 56.764848912), (45, 60)],
                    knots=[0, 0, 0, 0, 1, 1, 1, 1], degree=3))
                ThreePointArc((45, 60), (63.062468947, 40.597105935), (73.246612793, 16.122459937))
            make_face()
        extrude(amount=BOSS_EXTRUDE17_DEPTH)

    # Fillet1
    fillet1_edges = [part_1.edges().sort_by_distance(p)[0] for p in [
        (68.761048614, 7.1, 7.379668736),
        (-65.712929483, 3.2, -21.552508362),
    ]]
    fillet(fillet1_edges, radius=FILLET1_R)

    # Fillet2
    fillet2_edges = [part_1.edges().sort_by_distance(p)[0] for p in [
        (-90.240684265, 0, -26.829444174),
        (93.290060906, 0, 12.655619599),
    ]]
    fillet(fillet2_edges, radius=FILLET2_R)

    # Chamfer1
    # the kernel refuses this chamfer: 4.928784719, 4 mm, written as the material it adds along each edge
    with BuildSketch(Plane(origin=(74.946642057, 0, 2.82857638), x_dir=(0.003130013982796916, 0, -0.9999951014942361), z_dir=(0, 1, 0))) as chamfer1_piece_1:
        with BuildLine():
            Line((5.187956974, 0), (-CHAMFER1_SIZE * 0.207267820644, -CHAMFER1_SIZE * 0.978284238105))
            Line((-CHAMFER1_SIZE * 0.207267820644, -CHAMFER1_SIZE * 0.978284238105), (0, 0))
            ThreePointArc((0, 0), (2.676724413, -0.04482594), (5.187956974, 0))
        make_face()
    extrude(amount=7.1)
    with BuildSketch(Plane(origin=(-69.478875321, 2.5, -28.243333445), x_dir=(-0.977630694797596, 0, -0.21032884868598029), z_dir=(0, -1, 0))) as chamfer1_piece_2:
        with BuildLine():
            Line((CHAMFER1_SIZE_2, 0), (-0.823940493, 4.031059203))
            ThreePointArc((-0.823940493, 4.031059203), (-0.398710918, 2.091402767), (0, 0))
            Line((0, 0), (CHAMFER1_SIZE_2, 0))
        make_face()
    extrude(amount=2.5)
    with BuildSketch(Plane(origin=(-69.478875321, 2.5, -28.243333445), x_dir=(-0.9776306947975952, 0, -0.21032884868598303), z_dir=(0, 1, 0))) as chamfer1_piece_3:
        with BuildLine():
            Line((CHAMFER1_SIZE_2, 0), (-0.823940493, -4.031059203))
            ThreePointArc((-0.823940493, -4.031059203), (-0.398710918, -2.091402767), (0, 0))
            Line((0, 0), (CHAMFER1_SIZE_2, 0))
        make_face()
    extrude(amount=0.7)

    # Sketch25 → Boss-Extrude18 (add)
    with SkipClean():  # the faces are left unmerged after this step: merging them gives an invalid solid
        with BuildSketch(Plane.XZ):
            Polygon((-12.606911977, -73.932846357), (-16.182593512, -91.155483124), (-7.955963317, -91.860442679), (-6.354897298, -73.176565057), (-12.684878546, -72.072051611), align=None)
            Polygon((48.260184635, -52.648168475), (64.190977024, -69.783014191), (57.619762564, -74.829359836), (43.782660257, -56.811060424), align=None)
        extrude(amount=-BOSS_EXTRUDE18_DEPTH)


solid = part_1.part
